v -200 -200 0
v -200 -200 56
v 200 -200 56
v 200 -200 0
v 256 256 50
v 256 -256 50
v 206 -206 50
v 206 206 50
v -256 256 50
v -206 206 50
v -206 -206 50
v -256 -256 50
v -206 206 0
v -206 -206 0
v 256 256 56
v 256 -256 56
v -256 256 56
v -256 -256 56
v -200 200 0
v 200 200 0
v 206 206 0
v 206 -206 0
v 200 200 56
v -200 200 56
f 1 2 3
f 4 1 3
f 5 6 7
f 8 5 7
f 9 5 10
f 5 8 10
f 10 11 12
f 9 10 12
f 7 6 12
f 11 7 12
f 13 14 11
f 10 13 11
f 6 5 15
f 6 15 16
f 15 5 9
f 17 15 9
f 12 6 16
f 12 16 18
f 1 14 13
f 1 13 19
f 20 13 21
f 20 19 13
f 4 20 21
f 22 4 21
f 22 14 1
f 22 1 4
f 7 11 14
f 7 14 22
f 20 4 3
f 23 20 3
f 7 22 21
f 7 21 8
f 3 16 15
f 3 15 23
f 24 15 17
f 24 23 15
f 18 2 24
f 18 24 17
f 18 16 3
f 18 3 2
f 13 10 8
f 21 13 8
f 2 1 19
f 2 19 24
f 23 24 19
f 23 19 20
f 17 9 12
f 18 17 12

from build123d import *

# Parameters (mm, degrees)
SKETCH_W     = 400
SKETCH_H     = 60
PAD_DEPTH    = 200
SKETCH052_W  = 412
SKETCH052_H  = 50
PAD001_DEPTH = 206
SKETCH053_W  = 512
SKETCH053_H  = 512
PAD002_DEPTH = 6


with BuildPart() as body:
    # Sketch → Pad (new body, symmetric)
    with BuildSketch(Plane.XZ):
        with Locations((0, 30)):
            Rectangle(SKETCH_W, SKETCH_H)
    extrude(amount=PAD_DEPTH, both=True)


with BuildPart() as cut006:
    # Sketch052 → Pad001 (new body, symmetric)
    with BuildSketch(Plane.XZ):
        with Locations((0, 25)):
            Rectangle(SKETCH052_W, SKETCH052_H)
    extrude(amount=PAD001_DEPTH, both=True)

    # Sketch053 (on Face3 of Pad001) → Pad002 (join)
    with BuildSketch(Plane(origin=(0, 0, 50), x_dir=(-1, 0, 0), z_dir=(0, 0, 1))):
        Rectangle(SKETCH053_W, SKETCH053_H)
    extrude(amount=PAD002_DEPTH)

    # Cut006: cut Body
    add(body.part, mode=Mode.SUBTRACT)


solid = cut006.part
